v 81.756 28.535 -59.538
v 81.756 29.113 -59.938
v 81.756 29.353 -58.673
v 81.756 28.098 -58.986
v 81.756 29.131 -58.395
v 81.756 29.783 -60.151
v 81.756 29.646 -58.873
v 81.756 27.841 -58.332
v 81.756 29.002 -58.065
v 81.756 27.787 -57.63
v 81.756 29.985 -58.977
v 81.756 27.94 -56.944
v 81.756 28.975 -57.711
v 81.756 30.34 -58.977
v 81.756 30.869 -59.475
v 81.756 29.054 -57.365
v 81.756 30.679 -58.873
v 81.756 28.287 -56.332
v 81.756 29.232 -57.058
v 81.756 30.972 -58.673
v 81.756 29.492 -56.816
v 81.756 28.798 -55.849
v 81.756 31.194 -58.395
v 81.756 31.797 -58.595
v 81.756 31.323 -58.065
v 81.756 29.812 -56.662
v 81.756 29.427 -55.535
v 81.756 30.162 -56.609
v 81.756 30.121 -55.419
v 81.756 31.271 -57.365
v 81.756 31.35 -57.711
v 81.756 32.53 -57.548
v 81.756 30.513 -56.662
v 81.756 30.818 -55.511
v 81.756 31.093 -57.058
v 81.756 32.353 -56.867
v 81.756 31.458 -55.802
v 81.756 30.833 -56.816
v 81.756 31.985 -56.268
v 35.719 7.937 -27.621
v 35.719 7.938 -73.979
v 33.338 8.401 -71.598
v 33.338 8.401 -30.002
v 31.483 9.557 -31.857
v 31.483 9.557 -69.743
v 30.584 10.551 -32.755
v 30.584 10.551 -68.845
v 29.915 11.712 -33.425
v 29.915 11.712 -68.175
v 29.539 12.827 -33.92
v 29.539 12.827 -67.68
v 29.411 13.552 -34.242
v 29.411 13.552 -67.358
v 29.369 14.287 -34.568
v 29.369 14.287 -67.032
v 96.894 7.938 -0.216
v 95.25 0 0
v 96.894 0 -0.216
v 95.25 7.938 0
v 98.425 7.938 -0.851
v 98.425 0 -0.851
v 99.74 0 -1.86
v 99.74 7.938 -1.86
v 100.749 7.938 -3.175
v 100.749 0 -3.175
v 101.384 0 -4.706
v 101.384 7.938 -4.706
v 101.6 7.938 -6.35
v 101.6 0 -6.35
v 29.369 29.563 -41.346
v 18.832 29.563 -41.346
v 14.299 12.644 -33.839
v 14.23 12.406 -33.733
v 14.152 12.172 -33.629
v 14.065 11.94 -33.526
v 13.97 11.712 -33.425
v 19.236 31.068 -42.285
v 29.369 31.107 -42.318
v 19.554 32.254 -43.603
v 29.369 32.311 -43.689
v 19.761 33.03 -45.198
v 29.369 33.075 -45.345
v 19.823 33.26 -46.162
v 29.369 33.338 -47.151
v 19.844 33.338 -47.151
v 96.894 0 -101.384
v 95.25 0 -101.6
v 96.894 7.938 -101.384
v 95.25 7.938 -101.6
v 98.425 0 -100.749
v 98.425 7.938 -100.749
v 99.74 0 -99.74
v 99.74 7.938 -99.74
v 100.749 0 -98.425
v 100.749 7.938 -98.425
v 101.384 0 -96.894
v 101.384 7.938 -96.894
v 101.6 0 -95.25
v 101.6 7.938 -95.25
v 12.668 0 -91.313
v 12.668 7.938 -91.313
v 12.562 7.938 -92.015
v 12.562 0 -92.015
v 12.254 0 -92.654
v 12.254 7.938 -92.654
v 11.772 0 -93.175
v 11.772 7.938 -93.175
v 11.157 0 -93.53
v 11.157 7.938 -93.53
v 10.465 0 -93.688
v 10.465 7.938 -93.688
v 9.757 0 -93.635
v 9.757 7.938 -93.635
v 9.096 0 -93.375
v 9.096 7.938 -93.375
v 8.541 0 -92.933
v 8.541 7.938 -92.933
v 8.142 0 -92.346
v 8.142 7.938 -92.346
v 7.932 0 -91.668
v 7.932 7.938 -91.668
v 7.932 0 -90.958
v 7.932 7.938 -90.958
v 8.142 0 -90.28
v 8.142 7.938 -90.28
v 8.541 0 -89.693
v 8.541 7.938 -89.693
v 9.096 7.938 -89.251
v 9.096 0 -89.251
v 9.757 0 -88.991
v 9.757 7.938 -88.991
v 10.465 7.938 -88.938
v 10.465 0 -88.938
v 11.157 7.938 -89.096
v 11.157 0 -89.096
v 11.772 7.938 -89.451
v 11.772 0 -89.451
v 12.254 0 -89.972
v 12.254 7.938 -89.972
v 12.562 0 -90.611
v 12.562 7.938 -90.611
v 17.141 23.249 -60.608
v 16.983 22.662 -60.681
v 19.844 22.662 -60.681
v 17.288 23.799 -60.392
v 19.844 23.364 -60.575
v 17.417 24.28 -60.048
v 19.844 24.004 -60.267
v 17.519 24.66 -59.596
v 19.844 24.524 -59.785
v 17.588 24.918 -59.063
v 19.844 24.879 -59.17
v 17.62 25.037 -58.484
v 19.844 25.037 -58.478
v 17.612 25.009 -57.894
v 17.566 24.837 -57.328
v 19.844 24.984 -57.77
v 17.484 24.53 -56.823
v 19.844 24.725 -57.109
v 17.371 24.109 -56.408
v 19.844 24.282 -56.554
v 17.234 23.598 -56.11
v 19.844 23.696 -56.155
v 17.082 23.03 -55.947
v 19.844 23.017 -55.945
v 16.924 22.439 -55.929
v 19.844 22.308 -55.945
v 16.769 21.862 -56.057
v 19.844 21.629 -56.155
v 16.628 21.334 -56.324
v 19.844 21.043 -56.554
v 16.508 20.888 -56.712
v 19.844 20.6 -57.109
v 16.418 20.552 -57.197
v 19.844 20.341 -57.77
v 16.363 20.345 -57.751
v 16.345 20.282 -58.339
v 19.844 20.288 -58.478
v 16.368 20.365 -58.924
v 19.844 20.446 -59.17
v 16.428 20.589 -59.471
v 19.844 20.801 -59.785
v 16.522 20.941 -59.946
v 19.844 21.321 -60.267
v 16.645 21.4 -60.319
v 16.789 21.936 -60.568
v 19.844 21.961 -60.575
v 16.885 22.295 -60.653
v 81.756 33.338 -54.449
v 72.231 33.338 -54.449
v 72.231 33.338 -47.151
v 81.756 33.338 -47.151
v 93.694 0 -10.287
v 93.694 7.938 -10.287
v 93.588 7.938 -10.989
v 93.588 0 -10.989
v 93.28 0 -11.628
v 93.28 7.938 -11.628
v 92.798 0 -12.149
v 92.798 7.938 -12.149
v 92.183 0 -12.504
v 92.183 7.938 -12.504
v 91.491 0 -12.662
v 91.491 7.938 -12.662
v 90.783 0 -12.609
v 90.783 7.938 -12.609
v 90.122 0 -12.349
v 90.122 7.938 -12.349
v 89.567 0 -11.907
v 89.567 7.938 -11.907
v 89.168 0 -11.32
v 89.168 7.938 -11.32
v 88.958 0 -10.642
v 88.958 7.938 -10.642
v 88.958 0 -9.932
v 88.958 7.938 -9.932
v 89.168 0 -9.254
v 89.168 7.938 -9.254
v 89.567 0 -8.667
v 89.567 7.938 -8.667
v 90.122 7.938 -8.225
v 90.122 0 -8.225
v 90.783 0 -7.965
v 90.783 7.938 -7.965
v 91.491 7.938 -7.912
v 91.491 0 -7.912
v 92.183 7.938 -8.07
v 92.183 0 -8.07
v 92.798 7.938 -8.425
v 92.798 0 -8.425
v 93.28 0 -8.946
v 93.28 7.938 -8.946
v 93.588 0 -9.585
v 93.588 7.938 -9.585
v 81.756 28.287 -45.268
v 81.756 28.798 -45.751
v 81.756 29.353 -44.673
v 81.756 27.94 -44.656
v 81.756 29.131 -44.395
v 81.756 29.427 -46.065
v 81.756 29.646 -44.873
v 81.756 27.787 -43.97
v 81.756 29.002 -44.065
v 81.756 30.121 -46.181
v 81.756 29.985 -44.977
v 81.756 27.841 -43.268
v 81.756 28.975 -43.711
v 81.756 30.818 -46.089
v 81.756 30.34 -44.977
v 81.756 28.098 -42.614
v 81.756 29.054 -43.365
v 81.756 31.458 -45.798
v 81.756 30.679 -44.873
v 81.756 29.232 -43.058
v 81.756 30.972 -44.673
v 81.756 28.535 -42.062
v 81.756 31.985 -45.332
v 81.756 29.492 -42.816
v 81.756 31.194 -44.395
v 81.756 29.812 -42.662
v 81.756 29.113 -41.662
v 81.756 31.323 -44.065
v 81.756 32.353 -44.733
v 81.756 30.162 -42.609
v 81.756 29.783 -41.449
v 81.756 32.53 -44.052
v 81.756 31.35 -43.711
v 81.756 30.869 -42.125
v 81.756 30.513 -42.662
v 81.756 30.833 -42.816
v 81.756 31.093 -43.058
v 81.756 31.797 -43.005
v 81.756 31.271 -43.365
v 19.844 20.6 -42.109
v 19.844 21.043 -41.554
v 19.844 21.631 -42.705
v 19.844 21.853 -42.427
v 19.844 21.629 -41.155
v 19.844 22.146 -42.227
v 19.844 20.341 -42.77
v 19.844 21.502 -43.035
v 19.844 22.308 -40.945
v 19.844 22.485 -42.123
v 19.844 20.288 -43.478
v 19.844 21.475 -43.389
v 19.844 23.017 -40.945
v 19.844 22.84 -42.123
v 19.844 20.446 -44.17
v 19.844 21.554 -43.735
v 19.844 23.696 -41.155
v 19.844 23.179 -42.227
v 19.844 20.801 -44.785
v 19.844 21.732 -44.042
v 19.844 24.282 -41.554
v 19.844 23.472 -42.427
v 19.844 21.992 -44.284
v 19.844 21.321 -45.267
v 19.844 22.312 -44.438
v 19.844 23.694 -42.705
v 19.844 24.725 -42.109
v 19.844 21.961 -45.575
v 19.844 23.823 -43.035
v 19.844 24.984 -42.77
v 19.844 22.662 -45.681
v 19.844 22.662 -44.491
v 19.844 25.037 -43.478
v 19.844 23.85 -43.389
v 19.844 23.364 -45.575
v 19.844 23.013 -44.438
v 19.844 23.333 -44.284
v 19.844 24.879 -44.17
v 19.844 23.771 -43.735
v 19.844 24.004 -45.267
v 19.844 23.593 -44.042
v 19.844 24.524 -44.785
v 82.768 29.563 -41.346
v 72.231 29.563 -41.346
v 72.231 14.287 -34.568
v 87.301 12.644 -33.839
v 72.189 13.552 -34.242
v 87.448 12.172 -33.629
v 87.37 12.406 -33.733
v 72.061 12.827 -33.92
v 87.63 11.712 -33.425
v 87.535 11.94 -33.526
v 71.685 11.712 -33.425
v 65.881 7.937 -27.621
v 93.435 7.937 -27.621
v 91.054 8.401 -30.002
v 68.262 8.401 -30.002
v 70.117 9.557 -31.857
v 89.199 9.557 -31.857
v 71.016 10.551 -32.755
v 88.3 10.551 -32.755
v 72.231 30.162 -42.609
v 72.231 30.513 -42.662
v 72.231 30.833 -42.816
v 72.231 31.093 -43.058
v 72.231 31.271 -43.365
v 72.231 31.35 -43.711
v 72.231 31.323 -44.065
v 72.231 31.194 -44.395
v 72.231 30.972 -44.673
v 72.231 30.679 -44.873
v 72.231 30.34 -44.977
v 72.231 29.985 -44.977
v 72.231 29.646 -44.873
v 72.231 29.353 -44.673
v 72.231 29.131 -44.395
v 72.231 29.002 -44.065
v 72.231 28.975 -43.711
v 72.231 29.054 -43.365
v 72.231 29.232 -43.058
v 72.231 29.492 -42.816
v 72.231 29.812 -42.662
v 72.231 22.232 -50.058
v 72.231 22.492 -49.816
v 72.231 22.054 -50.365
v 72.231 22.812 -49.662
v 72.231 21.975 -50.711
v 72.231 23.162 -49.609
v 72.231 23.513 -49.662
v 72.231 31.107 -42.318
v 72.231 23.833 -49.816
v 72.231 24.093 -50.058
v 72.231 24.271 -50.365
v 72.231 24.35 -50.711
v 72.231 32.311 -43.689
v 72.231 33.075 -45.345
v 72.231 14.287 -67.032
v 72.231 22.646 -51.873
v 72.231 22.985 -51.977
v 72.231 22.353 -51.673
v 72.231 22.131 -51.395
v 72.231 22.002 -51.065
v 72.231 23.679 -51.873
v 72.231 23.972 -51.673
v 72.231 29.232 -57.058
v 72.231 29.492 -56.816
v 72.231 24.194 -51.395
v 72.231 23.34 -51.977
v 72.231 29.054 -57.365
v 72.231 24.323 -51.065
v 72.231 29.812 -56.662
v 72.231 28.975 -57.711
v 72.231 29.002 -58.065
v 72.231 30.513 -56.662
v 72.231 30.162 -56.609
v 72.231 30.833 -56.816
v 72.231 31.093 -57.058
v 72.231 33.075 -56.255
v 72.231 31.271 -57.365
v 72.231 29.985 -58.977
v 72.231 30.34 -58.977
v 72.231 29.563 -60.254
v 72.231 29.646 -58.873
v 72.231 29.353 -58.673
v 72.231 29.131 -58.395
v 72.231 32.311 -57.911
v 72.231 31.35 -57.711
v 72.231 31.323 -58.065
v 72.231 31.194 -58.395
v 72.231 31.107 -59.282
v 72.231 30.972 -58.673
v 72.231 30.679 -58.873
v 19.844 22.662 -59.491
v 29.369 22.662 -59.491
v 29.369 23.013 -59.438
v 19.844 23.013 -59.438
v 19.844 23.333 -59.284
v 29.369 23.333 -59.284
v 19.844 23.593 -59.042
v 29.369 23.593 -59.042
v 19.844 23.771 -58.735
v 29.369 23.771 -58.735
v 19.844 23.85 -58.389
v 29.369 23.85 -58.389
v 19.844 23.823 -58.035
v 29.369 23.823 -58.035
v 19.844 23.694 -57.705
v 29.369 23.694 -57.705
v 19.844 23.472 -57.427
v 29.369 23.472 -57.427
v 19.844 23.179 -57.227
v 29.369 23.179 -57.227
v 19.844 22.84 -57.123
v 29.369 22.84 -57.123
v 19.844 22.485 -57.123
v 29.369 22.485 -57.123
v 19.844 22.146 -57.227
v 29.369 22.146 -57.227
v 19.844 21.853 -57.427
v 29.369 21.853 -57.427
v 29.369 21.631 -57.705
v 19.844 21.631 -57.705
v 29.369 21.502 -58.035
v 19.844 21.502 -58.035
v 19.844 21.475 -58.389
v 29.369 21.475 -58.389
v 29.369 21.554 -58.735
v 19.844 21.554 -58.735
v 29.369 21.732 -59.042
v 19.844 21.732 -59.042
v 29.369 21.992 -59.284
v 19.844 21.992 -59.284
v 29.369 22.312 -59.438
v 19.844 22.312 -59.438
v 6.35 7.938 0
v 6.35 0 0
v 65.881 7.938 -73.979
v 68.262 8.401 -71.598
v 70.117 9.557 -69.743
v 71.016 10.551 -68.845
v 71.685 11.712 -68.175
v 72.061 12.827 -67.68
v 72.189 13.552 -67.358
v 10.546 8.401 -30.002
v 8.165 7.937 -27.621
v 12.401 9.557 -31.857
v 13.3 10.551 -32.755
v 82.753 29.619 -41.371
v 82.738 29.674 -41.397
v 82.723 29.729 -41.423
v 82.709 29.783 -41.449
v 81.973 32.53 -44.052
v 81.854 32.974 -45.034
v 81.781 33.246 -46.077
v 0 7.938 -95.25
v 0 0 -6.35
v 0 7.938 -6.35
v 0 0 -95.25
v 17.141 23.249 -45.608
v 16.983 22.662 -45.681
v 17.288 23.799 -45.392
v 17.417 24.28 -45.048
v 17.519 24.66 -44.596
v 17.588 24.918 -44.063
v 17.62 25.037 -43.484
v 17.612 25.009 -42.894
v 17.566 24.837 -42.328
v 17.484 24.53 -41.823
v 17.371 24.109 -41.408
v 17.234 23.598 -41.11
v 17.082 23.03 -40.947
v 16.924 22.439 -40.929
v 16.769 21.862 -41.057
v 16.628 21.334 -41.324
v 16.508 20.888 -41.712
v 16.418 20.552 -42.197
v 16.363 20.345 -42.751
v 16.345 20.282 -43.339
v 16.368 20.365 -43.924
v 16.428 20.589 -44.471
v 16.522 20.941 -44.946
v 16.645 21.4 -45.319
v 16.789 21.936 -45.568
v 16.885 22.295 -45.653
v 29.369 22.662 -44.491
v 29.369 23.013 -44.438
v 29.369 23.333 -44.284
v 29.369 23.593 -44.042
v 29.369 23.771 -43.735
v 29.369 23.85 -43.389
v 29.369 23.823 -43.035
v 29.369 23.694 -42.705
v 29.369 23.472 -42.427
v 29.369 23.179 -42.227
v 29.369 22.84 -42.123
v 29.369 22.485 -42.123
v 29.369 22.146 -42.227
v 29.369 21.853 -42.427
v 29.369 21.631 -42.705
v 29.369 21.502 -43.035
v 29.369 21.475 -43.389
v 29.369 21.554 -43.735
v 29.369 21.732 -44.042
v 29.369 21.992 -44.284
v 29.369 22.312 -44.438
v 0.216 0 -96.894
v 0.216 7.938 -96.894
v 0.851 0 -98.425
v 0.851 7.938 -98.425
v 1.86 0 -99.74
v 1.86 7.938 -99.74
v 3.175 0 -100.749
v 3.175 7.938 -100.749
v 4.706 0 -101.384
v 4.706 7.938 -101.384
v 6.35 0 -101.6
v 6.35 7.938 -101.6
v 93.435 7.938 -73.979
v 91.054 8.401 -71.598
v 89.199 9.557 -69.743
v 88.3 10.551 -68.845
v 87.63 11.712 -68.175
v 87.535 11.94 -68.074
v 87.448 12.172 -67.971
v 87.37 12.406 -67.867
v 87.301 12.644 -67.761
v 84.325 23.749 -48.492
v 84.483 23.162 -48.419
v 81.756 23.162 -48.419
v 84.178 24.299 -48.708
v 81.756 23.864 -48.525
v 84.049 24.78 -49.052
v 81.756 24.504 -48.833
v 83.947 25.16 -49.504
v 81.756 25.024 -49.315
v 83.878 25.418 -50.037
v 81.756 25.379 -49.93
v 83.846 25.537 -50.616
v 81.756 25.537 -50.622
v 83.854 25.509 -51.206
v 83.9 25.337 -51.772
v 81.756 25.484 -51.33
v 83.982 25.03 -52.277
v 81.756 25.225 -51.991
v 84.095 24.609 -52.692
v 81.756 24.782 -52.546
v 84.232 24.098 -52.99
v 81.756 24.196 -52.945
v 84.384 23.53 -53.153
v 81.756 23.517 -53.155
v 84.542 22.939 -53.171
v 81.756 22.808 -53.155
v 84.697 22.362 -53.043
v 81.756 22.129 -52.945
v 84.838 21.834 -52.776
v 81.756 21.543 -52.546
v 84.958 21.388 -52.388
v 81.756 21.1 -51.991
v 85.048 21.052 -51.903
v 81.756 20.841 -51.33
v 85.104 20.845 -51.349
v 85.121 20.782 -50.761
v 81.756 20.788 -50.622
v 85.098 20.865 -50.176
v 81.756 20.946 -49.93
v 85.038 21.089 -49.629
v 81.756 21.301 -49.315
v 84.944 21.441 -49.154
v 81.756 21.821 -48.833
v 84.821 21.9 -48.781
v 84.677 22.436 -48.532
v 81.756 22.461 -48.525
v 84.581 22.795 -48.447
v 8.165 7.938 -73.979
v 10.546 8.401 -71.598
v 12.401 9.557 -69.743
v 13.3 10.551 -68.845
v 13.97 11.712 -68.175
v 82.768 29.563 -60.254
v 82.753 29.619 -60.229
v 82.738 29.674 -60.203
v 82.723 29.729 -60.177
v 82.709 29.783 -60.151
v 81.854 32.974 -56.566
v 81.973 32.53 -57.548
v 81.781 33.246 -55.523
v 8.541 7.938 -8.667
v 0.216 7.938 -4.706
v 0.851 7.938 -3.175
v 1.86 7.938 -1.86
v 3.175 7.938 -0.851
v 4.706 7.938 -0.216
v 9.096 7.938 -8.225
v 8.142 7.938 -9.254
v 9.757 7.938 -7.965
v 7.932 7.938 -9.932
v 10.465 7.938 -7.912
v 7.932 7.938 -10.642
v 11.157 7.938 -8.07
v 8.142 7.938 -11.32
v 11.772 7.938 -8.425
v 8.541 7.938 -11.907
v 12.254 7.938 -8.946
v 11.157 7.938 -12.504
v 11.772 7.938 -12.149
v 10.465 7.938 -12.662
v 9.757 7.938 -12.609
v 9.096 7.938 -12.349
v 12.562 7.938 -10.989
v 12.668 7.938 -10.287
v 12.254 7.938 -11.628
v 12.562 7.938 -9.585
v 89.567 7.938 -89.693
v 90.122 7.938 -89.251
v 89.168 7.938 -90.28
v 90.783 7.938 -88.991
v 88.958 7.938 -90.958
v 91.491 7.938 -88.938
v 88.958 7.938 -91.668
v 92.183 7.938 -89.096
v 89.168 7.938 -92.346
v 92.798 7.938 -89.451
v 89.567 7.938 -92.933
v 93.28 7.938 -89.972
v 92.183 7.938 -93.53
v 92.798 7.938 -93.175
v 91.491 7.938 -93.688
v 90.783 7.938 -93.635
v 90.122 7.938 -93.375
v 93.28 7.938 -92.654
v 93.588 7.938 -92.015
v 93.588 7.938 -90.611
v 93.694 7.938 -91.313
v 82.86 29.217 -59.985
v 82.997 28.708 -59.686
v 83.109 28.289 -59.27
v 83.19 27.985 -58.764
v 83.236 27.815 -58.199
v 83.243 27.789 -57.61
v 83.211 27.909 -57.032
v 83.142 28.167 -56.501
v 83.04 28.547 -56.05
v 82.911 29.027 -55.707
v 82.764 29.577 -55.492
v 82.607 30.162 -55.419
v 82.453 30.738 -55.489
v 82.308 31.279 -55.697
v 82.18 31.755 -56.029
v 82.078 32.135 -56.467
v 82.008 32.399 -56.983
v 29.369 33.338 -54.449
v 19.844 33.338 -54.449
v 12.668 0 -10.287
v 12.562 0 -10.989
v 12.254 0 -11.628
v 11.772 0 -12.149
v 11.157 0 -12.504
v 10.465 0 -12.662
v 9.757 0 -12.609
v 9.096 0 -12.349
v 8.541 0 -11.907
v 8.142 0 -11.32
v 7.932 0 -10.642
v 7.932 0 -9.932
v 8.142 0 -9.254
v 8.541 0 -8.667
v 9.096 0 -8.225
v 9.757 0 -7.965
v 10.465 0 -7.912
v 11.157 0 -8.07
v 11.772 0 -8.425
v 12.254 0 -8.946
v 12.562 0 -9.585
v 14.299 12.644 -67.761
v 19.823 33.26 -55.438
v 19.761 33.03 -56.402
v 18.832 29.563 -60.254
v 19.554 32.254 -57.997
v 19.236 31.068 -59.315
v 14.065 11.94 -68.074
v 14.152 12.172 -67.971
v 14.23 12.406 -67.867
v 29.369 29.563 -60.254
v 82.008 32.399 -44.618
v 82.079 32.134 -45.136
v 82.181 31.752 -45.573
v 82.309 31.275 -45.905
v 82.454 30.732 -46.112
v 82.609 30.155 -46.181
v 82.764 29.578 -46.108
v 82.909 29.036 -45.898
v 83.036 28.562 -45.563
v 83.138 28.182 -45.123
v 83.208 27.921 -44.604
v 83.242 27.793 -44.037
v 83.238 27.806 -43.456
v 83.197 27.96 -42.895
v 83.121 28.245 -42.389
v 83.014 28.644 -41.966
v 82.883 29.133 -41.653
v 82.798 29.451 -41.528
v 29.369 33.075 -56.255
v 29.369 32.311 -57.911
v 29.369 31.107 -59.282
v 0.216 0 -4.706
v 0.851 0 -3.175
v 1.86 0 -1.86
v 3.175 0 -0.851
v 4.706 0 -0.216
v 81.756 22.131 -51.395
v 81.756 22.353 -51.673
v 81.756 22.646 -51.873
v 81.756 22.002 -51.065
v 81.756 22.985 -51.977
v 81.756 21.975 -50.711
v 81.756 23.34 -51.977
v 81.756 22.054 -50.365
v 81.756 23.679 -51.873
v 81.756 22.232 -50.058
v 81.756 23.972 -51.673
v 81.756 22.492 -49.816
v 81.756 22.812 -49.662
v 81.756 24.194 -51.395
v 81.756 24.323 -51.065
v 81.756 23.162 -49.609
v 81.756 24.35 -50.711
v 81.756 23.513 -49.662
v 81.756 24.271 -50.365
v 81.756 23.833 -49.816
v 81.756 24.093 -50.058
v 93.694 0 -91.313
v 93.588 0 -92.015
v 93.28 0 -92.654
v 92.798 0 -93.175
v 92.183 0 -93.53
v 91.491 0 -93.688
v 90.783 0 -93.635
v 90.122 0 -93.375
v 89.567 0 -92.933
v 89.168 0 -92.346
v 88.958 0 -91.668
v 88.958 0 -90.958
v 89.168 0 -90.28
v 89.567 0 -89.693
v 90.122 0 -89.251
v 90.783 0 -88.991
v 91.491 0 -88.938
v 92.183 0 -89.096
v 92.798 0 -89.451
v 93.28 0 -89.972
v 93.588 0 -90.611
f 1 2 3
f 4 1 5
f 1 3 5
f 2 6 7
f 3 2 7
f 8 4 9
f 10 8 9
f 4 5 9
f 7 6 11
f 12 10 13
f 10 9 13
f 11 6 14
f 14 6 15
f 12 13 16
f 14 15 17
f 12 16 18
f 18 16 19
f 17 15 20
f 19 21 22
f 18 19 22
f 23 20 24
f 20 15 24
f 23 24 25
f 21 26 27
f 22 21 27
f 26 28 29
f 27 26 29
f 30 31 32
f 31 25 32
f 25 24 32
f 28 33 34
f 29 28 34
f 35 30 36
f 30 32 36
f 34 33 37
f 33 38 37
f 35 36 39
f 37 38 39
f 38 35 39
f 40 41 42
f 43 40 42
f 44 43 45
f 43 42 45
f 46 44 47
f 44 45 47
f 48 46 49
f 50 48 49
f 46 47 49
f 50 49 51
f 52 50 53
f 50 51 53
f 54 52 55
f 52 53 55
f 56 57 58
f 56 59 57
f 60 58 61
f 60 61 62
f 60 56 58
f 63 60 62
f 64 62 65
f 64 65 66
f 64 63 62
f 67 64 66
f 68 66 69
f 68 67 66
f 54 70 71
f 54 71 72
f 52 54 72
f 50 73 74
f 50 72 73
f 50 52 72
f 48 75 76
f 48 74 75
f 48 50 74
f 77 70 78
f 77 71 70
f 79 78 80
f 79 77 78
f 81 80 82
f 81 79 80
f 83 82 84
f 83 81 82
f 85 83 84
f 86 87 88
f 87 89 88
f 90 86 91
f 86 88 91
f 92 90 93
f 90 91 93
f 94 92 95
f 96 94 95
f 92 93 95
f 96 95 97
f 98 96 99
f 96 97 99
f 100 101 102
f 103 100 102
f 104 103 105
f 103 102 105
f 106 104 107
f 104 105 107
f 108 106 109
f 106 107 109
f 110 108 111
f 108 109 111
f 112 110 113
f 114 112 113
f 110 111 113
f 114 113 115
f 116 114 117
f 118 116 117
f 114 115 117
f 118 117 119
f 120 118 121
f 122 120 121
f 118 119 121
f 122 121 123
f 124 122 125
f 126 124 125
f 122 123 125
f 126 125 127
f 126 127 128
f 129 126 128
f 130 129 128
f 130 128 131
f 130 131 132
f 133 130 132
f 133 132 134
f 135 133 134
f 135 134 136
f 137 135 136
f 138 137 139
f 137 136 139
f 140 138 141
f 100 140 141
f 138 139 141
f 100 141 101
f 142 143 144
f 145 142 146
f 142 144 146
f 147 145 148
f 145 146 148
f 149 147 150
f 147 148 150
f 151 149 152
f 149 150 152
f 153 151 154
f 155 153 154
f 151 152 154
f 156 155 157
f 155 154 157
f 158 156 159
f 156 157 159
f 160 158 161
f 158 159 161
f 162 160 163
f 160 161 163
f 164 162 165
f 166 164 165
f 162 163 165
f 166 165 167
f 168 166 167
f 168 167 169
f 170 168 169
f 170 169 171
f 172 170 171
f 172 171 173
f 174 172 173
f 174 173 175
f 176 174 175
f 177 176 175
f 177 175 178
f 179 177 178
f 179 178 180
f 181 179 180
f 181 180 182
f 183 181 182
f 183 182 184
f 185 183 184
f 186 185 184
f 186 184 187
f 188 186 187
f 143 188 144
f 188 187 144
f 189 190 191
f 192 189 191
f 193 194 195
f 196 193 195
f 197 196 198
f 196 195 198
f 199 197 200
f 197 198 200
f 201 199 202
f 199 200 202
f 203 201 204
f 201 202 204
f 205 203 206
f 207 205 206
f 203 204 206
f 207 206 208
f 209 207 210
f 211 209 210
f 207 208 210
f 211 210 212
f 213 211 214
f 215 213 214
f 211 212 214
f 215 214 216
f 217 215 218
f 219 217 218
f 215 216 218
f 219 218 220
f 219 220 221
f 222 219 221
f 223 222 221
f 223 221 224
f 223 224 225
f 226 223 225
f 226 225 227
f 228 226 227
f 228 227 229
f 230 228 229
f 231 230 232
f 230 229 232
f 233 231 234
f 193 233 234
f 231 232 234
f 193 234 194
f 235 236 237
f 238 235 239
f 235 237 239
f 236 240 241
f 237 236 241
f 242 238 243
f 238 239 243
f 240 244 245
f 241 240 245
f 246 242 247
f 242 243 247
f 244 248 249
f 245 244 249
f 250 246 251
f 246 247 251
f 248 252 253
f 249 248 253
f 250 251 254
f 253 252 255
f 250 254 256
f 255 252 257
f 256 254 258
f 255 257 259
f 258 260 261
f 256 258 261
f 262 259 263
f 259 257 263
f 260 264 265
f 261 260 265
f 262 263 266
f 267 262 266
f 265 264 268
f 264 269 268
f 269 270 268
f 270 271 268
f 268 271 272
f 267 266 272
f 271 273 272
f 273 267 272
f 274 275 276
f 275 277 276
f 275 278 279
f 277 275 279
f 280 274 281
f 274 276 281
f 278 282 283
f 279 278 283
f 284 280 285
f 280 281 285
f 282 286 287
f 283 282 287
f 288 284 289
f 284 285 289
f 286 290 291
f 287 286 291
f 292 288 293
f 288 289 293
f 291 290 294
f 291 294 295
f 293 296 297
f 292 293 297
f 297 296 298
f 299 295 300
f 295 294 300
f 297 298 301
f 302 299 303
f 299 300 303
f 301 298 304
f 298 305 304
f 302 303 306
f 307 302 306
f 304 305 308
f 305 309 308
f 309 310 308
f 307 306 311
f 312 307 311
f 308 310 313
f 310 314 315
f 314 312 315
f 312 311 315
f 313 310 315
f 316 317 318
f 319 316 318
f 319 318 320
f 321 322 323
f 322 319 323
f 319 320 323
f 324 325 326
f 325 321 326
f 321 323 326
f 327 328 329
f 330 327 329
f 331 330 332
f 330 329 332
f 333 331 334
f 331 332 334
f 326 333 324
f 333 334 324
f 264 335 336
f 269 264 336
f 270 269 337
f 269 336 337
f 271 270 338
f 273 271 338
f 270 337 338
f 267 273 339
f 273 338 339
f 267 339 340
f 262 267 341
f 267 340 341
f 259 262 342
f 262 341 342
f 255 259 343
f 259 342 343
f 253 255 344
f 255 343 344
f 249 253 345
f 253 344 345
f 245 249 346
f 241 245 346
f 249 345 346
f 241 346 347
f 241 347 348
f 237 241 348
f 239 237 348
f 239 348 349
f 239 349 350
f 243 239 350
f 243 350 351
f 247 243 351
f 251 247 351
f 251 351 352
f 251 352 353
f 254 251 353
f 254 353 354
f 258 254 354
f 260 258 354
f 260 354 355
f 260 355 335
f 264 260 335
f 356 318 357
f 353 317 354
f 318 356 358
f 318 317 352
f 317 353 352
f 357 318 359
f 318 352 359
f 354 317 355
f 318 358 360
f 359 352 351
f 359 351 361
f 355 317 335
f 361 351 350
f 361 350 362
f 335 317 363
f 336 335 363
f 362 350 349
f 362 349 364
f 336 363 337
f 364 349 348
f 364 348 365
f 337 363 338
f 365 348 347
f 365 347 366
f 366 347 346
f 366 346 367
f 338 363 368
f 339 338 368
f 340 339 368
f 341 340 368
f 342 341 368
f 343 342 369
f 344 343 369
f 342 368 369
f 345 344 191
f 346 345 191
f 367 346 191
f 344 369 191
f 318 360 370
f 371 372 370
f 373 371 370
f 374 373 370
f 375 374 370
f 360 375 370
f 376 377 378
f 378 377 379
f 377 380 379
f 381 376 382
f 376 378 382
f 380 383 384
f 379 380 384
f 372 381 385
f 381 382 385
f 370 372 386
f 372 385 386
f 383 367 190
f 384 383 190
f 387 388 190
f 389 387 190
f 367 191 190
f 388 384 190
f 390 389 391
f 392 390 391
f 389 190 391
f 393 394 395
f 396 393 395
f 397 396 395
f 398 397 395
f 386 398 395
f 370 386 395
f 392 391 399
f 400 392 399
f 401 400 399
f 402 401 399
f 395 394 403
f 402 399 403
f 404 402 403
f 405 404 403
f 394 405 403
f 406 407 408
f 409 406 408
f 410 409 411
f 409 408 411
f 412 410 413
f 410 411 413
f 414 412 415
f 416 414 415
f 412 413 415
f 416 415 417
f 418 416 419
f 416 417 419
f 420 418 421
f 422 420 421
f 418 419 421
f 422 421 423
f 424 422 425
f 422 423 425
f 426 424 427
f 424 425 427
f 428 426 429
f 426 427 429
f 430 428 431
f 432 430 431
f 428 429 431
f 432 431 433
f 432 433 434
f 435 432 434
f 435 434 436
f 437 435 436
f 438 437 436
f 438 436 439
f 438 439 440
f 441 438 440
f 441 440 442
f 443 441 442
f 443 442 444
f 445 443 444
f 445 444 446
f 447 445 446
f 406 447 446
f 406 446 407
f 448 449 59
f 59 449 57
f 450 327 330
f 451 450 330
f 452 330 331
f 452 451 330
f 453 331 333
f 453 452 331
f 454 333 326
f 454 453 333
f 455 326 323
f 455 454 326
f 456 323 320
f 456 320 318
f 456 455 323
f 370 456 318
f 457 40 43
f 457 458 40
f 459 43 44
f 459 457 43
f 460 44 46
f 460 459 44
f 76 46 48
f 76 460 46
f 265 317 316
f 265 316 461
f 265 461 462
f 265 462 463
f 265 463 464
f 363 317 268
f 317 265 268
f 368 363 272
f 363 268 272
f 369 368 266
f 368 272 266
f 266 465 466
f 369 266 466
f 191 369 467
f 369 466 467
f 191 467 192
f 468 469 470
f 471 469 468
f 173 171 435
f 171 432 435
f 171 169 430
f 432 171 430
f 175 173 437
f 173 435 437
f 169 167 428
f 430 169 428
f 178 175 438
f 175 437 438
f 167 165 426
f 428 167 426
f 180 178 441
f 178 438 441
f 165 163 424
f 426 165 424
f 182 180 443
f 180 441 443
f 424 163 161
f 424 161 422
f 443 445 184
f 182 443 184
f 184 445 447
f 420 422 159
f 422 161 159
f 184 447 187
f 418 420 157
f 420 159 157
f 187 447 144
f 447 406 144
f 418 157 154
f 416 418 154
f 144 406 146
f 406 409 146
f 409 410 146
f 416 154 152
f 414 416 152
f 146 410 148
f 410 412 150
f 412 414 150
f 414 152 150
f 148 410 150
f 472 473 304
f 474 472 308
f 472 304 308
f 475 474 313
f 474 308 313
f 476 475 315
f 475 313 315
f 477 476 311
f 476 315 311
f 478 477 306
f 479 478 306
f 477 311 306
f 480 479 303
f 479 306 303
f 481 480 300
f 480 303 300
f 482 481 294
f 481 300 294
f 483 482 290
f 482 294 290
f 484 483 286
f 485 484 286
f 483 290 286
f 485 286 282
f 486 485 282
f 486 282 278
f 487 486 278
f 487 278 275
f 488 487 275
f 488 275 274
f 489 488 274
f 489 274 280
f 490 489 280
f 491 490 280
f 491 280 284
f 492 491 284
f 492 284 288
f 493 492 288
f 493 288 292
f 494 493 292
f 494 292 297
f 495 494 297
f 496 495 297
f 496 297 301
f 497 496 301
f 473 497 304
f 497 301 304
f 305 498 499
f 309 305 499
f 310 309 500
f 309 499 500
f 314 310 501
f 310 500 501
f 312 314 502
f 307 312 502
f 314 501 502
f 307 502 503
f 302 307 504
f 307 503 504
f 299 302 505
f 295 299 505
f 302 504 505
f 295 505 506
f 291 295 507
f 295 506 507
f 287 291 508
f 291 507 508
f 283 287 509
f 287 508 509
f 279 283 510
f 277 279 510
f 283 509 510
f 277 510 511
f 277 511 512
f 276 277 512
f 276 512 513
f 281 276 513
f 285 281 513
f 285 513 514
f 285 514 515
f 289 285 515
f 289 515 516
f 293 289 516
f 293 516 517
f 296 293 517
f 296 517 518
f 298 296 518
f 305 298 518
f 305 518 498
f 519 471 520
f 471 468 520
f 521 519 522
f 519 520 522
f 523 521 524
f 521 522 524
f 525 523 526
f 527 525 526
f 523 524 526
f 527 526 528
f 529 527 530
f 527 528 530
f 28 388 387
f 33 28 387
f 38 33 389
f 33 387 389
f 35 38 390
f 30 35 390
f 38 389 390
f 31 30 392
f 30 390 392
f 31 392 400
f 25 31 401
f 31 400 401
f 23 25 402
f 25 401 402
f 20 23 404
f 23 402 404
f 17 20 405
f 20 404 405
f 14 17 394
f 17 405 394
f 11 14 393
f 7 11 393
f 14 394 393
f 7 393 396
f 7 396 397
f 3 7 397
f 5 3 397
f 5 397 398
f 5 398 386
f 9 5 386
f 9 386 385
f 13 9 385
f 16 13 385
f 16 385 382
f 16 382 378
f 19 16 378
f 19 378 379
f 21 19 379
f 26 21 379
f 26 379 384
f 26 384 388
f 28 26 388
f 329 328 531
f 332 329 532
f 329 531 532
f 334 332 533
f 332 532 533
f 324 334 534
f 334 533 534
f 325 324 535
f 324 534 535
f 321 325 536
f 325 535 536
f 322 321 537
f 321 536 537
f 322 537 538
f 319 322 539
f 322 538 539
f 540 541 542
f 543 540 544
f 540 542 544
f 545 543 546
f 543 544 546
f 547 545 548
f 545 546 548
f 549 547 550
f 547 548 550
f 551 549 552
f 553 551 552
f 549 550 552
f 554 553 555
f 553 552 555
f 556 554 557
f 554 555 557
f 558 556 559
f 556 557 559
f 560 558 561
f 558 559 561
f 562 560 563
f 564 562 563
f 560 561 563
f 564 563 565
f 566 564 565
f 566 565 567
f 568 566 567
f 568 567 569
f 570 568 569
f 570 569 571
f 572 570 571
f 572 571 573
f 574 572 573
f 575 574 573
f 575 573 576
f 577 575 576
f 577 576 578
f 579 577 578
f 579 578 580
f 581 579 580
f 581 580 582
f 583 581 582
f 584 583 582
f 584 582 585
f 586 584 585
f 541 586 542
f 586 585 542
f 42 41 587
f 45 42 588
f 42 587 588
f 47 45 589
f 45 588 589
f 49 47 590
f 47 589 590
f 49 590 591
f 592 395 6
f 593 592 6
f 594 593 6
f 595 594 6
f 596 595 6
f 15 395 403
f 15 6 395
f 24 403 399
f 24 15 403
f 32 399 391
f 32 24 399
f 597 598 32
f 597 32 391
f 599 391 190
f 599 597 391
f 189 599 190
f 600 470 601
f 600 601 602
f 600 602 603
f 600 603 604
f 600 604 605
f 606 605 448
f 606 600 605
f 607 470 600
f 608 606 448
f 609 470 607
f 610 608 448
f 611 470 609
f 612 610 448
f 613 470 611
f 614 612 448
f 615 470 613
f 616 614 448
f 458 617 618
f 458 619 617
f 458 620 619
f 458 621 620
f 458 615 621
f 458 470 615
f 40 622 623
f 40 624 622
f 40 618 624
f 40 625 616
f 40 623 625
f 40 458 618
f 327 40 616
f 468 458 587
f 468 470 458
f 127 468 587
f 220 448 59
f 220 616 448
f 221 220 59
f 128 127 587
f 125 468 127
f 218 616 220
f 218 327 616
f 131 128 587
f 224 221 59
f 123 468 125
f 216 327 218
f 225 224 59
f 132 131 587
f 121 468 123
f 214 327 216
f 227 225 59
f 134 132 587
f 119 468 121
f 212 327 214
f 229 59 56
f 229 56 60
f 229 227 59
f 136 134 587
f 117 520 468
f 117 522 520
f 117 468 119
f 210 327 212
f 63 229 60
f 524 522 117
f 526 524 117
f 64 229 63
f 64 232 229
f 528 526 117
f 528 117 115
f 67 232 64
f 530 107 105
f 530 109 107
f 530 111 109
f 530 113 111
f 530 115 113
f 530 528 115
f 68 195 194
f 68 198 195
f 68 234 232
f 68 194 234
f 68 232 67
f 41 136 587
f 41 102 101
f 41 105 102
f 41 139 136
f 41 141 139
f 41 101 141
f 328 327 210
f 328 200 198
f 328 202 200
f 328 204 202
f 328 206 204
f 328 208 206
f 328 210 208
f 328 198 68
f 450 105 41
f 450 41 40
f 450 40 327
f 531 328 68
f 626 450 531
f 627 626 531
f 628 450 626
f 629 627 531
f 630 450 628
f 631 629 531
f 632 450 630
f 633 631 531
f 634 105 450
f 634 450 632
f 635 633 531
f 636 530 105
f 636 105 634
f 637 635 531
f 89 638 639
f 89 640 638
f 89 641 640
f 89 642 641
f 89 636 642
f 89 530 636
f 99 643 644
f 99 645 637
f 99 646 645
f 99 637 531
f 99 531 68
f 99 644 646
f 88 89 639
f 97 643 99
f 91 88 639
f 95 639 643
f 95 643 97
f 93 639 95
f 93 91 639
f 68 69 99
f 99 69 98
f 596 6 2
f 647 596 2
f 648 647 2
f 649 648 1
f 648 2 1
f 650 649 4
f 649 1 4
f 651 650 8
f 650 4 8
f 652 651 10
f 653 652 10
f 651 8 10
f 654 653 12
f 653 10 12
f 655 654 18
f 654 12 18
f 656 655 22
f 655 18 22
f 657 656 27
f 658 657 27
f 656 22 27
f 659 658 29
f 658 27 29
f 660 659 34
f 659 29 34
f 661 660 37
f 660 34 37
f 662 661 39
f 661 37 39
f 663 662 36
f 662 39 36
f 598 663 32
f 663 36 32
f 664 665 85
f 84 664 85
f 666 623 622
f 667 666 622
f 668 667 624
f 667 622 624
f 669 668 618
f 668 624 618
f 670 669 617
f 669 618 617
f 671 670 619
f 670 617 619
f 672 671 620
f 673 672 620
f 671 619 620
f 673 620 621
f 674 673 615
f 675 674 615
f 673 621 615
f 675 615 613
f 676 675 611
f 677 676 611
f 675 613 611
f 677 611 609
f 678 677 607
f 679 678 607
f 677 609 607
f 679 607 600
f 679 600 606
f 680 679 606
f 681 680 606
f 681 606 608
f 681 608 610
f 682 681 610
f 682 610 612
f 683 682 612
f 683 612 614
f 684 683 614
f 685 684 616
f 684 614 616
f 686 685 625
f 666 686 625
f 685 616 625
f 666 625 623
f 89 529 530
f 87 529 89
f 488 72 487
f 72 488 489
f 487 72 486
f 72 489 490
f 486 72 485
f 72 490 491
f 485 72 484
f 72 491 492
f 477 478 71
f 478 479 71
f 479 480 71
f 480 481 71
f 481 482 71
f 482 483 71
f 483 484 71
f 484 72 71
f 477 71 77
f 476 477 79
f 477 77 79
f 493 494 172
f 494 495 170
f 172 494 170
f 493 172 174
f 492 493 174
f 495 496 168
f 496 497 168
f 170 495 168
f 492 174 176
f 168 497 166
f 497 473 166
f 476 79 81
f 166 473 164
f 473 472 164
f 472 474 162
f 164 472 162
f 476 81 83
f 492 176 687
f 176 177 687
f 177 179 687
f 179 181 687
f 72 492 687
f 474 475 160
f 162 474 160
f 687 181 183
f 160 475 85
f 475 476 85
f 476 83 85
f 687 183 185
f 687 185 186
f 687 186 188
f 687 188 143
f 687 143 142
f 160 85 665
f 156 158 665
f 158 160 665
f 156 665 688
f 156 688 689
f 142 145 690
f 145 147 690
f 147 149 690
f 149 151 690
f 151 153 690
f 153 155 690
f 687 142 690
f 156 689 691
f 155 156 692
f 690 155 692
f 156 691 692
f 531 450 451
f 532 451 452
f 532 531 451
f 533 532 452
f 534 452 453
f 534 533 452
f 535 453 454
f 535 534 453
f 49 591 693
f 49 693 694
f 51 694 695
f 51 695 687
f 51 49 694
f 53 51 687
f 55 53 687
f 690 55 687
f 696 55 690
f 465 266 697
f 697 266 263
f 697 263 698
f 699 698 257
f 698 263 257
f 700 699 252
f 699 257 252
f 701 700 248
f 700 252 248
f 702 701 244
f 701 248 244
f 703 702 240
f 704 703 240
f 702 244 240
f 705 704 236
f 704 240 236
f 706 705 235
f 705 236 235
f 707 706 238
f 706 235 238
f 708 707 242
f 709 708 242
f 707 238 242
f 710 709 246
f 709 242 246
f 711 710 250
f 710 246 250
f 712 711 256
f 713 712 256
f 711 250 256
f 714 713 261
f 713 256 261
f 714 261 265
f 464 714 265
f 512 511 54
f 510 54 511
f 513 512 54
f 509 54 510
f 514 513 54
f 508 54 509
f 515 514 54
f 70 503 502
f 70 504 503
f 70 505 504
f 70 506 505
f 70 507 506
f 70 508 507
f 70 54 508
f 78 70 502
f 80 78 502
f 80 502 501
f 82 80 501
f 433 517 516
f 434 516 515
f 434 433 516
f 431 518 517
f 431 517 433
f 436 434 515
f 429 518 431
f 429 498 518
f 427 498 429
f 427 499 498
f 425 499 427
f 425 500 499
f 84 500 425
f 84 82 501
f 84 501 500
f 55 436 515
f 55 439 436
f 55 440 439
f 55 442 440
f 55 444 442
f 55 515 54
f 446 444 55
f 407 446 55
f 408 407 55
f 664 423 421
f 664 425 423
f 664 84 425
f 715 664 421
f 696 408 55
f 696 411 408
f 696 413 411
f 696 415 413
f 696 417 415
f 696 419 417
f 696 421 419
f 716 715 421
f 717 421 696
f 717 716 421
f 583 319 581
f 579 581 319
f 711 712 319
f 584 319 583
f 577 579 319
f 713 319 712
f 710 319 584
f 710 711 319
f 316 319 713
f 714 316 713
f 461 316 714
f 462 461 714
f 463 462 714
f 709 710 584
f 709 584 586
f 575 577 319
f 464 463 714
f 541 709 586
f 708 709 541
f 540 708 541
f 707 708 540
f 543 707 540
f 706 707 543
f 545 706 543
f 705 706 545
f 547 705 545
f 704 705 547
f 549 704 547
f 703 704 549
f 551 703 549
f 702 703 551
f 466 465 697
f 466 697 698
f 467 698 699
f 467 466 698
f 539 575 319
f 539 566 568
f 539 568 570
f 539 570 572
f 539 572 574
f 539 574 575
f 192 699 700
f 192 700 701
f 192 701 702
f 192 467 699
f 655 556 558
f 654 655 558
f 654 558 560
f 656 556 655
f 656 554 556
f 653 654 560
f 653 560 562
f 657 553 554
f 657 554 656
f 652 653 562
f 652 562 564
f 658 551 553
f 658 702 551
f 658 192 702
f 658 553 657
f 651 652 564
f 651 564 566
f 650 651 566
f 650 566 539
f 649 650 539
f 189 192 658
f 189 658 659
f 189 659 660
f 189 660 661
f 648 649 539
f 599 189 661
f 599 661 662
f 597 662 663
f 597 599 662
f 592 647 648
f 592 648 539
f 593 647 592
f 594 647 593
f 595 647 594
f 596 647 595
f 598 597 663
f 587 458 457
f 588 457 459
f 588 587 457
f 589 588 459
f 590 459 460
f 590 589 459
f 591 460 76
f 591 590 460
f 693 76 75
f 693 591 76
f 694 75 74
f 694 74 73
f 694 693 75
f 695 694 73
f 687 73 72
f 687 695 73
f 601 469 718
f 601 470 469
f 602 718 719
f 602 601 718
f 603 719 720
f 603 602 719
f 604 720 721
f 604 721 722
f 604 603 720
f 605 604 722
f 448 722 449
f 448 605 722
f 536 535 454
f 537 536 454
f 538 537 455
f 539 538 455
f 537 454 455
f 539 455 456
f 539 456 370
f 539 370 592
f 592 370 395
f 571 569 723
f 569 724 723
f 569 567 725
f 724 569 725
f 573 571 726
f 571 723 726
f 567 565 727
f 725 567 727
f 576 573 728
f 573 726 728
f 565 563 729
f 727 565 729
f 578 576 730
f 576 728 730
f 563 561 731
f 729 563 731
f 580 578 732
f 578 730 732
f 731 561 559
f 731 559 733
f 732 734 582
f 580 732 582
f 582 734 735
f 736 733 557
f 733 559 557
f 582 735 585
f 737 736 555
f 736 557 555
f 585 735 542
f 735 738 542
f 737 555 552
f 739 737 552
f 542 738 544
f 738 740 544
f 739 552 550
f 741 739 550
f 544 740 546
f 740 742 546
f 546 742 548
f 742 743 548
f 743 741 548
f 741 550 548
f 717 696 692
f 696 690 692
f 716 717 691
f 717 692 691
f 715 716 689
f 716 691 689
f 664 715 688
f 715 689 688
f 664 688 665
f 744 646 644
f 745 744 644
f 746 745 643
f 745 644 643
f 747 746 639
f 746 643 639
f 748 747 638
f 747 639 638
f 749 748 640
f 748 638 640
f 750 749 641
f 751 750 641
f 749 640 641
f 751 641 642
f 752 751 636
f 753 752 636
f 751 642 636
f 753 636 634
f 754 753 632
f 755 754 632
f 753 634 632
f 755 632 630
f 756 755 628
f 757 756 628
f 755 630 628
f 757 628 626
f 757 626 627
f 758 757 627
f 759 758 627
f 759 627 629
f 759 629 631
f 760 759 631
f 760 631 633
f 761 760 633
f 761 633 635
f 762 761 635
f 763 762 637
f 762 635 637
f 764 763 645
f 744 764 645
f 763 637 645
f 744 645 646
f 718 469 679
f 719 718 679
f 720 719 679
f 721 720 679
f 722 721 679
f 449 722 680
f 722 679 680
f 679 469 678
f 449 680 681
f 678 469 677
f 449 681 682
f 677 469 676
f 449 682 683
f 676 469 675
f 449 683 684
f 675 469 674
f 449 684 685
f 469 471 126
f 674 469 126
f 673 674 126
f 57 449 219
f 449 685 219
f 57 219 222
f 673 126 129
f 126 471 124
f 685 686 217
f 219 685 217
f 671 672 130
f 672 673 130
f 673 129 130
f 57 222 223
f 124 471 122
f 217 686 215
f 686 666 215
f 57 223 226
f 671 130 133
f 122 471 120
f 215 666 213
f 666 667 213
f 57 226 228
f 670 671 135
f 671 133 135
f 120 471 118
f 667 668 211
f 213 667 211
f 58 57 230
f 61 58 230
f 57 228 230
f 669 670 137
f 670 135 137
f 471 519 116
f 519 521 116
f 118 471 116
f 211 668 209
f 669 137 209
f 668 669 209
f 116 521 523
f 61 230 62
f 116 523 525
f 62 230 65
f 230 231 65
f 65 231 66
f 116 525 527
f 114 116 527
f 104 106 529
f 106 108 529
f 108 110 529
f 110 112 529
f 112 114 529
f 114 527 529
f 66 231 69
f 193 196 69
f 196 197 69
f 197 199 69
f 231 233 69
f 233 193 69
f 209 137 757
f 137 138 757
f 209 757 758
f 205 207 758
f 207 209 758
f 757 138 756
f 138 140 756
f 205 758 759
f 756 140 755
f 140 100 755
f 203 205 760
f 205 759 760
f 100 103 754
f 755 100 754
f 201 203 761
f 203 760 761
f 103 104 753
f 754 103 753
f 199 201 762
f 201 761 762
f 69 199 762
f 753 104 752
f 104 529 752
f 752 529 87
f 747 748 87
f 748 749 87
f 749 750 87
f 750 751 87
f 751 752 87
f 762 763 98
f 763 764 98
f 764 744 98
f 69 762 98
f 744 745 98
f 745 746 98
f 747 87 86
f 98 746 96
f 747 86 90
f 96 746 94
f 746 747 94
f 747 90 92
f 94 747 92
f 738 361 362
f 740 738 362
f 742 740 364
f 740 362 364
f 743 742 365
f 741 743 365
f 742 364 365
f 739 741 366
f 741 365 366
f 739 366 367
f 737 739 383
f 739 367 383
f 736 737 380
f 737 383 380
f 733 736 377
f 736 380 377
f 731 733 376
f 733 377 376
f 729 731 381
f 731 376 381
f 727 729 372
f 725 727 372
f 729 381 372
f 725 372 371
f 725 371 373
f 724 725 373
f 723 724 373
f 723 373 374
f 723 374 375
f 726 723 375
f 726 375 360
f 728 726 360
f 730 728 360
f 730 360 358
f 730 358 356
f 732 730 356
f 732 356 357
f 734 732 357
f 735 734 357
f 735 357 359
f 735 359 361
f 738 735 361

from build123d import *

# Parameters (mm, degrees)
SKETCH1_W           = 101.6
SKETCH1_H           = 101.6
BOSS_EXTRUDE1_DEPTH = 7.9375
BOSS_EXTRUDE2_DEPTH = 9.525
DRAFT2_ANGLE        = 15
DRAFT3_ANGLE        = 15
FILLET3_R           = 6.35
CUT_EXTRUDE1_REACH  = 31.369
SKETCH3_R           = 1.190625
SKETCH4_R           = 2.38125
CUT_EXTRUDE2_DEPTH  = 6.35
SKETCH5_R           = 2.38125
CUT_EXTRUDE3_DEPTH  = 7.9375
CUT_EXTRUDE4_REACH  = 31.369
SKETCH6_R           = 1.190625
CUT_EXTRUDE5_REACH  = 21.844
SKETCH7_R           = 2.38125
SKETCH7_R_2         = 1.190625
FILLET4_R           = 6.35


with BuildPart() as part:
    # Sketch1 → Boss-Extrude1 (new body)
    with BuildSketch(Plane(origin=(0, 0, 0), x_dir=(1, 0, 0), z_dir=(0, 1, 0))):
        with Locations((50.8, 50.8)):
            Rectangle(SKETCH1_W, SKETCH1_H)
    extrude(amount=BOSS_EXTRUDE1_DEPTH)

    # Sketch2 → Boss-Extrude2 (add)
    with BuildSketch(Plane.ZY.offset(-29.36875)):
        Polygon((-31.75, 7.9375), (-69.85, 7.9375), (-58.57875, 33.3375), (-43.02125, 33.3375), align=None)
    boss_extrude2 = extrude(amount=BOSS_EXTRUDE2_DEPTH)

    # Draft2
    draft2_faces = [part.faces().sort_by_distance(p)[0] for p in [
        (19.84375, 18.858999014, -50.8),
    ]]
    draft(draft2_faces, Plane(origin=(19.84375, 33.3375, -58.57875), x_dir=(0, 0, 1), z_dir=(0, 1, 0)), DRAFT2_ANGLE)

    # Mirror2: Boss-Extrude2 across plane
    add(boss_extrude2.mirror(Plane.ZY.offset(-50.8)))

    # Draft3
    draft3_faces = [part.faces().sort_by_distance(p)[0] for p in [
        (81.75625, 18.858999014, -50.8),
    ]]
    draft(draft3_faces, Plane(origin=(81.75625, 33.3375, -58.57875), x_dir=(0, 0, 1), z_dir=(0, 1, 0)), DRAFT3_ANGLE)

    # Fillet3
    fillet3_edges = [part.edges().sort_by_distance(p)[0] for p in [
        (21.203295256, 7.9375, -31.75),
        (24.60625, 33.3375, -43.02125),
        (24.60625, 33.3375, -58.57875),
        (29.36875, 7.9375, -50.8),
        (21.203295256, 7.9375, -69.85),
        (13.037840512, 7.9375, -50.8),
        (76.99375, 33.3375, -43.02125),
        (88.562159488, 7.9375, -50.8),
        (80.396704744, 7.9375, -31.75),
        (80.396704744, 7.9375, -69.85),
        (76.99375, 33.3375, -58.57875),
        (72.23125, 7.9375, -50.8),
    ]]
    fillet(fillet3_edges, radius=FILLET3_R)

    # Cut-Extrude1: up to this face of the body (flat: up to its plane)
    cut_extrude1_end = Plane(part.part.faces().sort_by_distance((84.905739541, 21.583445016, -50.8))[0])
    # Sketch3 → Cut-Extrude1 (cut, up to the picked face)
    with BuildSketch(Plane.ZY.offset(-72.23125), mode=Mode.PRIVATE) as cut_extrude1_sk1:
        with Locations((-57.8, 30.1625)):
            Circle(SKETCH3_R)
    cut_extrude1_tool1 = split(extrude(cut_extrude1_sk1.sketch, amount=-CUT_EXTRUDE1_REACH, mode=Mode.PRIVATE), bisect_by=cut_extrude1_end, keep=Keep.BOTH, mode=Mode.PRIVATE)
    add(cut_extrude1_tool1.solids().sort_by_distance((72.23125, 30.1625, -57.8))[0], mode=Mode.SUBTRACT)
    # Sketch3 → Cut-Extrude1 (cut, up to the picked face)
    with BuildSketch(Plane.ZY.offset(-72.23125), mode=Mode.PRIVATE) as cut_extrude1_sk2:
        with Locations((-43.8, 30.1625)):
            Circle(SKETCH3_R)
    cut_extrude1_tool2 = split(extrude(cut_extrude1_sk2.sketch, amount=-CUT_EXTRUDE1_REACH, mode=Mode.PRIVATE), bisect_by=cut_extrude1_end, keep=Keep.BOTH, mode=Mode.PRIVATE)
    add(cut_extrude1_tool2.solids().sort_by_distance((72.23125, 30.1625, -43.8))[0], mode=Mode.SUBTRACT)
    # Sketch3 → Cut-Extrude1 (cut, up to the picked face)
    with BuildSketch(Plane.ZY.offset(-72.23125), mode=Mode.PRIVATE) as cut_extrude1_sk3:
        with Locations((-50.8, 23.1625)):
            Circle(SKETCH3_R)
    cut_extrude1_tool3 = split(extrude(cut_extrude1_sk3.sketch, amount=-CUT_EXTRUDE1_REACH, mode=Mode.PRIVATE), bisect_by=cut_extrude1_end, keep=Keep.BOTH, mode=Mode.PRIVATE)
    add(cut_extrude1_tool3.solids().sort_by_distance((72.23125, 23.1625, -50.8))[0], mode=Mode.SUBTRACT)

    # Sketch4 → Cut-Extrude2 (cut)
    with BuildSketch(Plane.ZY.offset(-81.75625)):
        with Locations((-43.8, 30.1625)):
            Circle(SKETCH4_R)
        with Locations((-57.8, 30.1625)):
            Circle(SKETCH4_R)
        with Locations((-50.8, 23.1625)):
            Circle(SKETCH4_R)
    extrude(amount=-CUT_EXTRUDE2_DEPTH, mode=Mode.SUBTRACT)

    # Sketch5 → Cut-Extrude3 (cut)
    with BuildSketch(Plane(origin=(0, 7.9375, 0), x_dir=(1, 0, 0), z_dir=(0, 1, 0))):
        with Locations((10.287, 91.313)):
            Circle(SKETCH5_R)
        with Locations((10.287, 10.287)):
            Circle(SKETCH5_R)
        with Locations((91.313, 10.287)):
            Circle(SKETCH5_R)
        with Locations((91.313, 91.313)):
            Circle(SKETCH5_R)
    extrude(amount=-CUT_EXTRUDE3_DEPTH, mode=Mode.SUBTRACT)

    # Cut-Extrude4: up to this face of the body (flat: up to its plane)
    cut_extrude4_end = Plane(part.part.faces().sort_by_distance((16.694260459, 21.583445016, -50.8))[0])
    # Sketch6 → Cut-Extrude4 (cut, up to the picked face)
    with BuildSketch(Plane(origin=(29.36875, 0, 0), x_dir=(0, 0, -1), z_dir=(1, 0, 0)), mode=Mode.PRIVATE) as cut_extrude4_sk1:
        with Locations((43.3, 22.6625)):
            Circle(SKETCH6_R)
    cut_extrude4_tool1 = split(extrude(cut_extrude4_sk1.sketch, amount=-CUT_EXTRUDE4_REACH, mode=Mode.PRIVATE), bisect_by=cut_extrude4_end, keep=Keep.BOTH, mode=Mode.PRIVATE)
    add(cut_extrude4_tool1.solids().sort_by_distance((29.36875, 22.6625, -43.3))[0], mode=Mode.SUBTRACT)
    # Sketch6 → Cut-Extrude4 (cut, up to the picked face)
    with BuildSketch(Plane(origin=(29.36875, 0, 0), x_dir=(0, 0, -1), z_dir=(1, 0, 0)), mode=Mode.PRIVATE) as cut_extrude4_sk2:
        with Locations((58.3, 22.6625)):
            Circle(SKETCH6_R)
    cut_extrude4_tool2 = split(extrude(cut_extrude4_sk2.sketch, amount=-CUT_EXTRUDE4_REACH, mode=Mode.PRIVATE), bisect_by=cut_extrude4_end, keep=Keep.BOTH, mode=Mode.PRIVATE)
    add(cut_extrude4_tool2.solids().sort_by_distance((29.36875, 22.6625, -58.3))[0], mode=Mode.SUBTRACT)

    # Sketch7 → Cut-Extrude5 (cut, up to next)
    with BuildSketch(Plane(origin=(19.84375, 0, 0), x_dir=(0, 0, -1), z_dir=(1, 0, 0)), mode=Mode.PRIVATE) as cut_extrude5_sk1:
        with Locations((58.3, 22.6625)):
            Circle(SKETCH7_R)
        with Locations((58.3, 22.6625)):
            Circle(SKETCH7_R_2, mode=Mode.SUBTRACT)
    cut_extrude5_tool1 = extrude(cut_extrude5_sk1.sketch, amount=-CUT_EXTRUDE5_REACH, mode=Mode.PRIVATE) & part.part
    add(cut_extrude5_tool1.solids().sort_by_distance((19.84375, 22.6625, -55.986102))[0], mode=Mode.SUBTRACT)
    # Sketch7 → Cut-Extrude5 (cut, up to next)
    with BuildSketch(Plane(origin=(19.84375, 0, 0), x_dir=(0, 0, -1), z_dir=(1, 0, 0)), mode=Mode.PRIVATE) as cut_extrude5_sk2:
        with Locations((43.3, 22.6625)):
            Circle(SKETCH7_R)
        with Locations((43.3, 22.6625)):
            Circle(SKETCH7_R_2, mode=Mode.SUBTRACT)
    cut_extrude5_tool2 = extrude(cut_extrude5_sk2.sketch, amount=-CUT_EXTRUDE5_REACH, mode=Mode.PRIVATE) & part.part
    add(cut_extrude5_tool2.solids().sort_by_distance((19.84375, 22.6625, -40.986102))[0], mode=Mode.SUBTRACT)

    # Fillet4
    fillet4_edges = [part.edges().sort_by_distance(p)[0] for p in [
        (0, 3.96875, -101.6),
        (101.6, 3.96875, -101.6),
        (101.6, 3.96875, 0),
        (0, 3.96875, 0),
    ]]
    fillet(fillet4_edges, radius=FILLET4_R)


solid = part.part
